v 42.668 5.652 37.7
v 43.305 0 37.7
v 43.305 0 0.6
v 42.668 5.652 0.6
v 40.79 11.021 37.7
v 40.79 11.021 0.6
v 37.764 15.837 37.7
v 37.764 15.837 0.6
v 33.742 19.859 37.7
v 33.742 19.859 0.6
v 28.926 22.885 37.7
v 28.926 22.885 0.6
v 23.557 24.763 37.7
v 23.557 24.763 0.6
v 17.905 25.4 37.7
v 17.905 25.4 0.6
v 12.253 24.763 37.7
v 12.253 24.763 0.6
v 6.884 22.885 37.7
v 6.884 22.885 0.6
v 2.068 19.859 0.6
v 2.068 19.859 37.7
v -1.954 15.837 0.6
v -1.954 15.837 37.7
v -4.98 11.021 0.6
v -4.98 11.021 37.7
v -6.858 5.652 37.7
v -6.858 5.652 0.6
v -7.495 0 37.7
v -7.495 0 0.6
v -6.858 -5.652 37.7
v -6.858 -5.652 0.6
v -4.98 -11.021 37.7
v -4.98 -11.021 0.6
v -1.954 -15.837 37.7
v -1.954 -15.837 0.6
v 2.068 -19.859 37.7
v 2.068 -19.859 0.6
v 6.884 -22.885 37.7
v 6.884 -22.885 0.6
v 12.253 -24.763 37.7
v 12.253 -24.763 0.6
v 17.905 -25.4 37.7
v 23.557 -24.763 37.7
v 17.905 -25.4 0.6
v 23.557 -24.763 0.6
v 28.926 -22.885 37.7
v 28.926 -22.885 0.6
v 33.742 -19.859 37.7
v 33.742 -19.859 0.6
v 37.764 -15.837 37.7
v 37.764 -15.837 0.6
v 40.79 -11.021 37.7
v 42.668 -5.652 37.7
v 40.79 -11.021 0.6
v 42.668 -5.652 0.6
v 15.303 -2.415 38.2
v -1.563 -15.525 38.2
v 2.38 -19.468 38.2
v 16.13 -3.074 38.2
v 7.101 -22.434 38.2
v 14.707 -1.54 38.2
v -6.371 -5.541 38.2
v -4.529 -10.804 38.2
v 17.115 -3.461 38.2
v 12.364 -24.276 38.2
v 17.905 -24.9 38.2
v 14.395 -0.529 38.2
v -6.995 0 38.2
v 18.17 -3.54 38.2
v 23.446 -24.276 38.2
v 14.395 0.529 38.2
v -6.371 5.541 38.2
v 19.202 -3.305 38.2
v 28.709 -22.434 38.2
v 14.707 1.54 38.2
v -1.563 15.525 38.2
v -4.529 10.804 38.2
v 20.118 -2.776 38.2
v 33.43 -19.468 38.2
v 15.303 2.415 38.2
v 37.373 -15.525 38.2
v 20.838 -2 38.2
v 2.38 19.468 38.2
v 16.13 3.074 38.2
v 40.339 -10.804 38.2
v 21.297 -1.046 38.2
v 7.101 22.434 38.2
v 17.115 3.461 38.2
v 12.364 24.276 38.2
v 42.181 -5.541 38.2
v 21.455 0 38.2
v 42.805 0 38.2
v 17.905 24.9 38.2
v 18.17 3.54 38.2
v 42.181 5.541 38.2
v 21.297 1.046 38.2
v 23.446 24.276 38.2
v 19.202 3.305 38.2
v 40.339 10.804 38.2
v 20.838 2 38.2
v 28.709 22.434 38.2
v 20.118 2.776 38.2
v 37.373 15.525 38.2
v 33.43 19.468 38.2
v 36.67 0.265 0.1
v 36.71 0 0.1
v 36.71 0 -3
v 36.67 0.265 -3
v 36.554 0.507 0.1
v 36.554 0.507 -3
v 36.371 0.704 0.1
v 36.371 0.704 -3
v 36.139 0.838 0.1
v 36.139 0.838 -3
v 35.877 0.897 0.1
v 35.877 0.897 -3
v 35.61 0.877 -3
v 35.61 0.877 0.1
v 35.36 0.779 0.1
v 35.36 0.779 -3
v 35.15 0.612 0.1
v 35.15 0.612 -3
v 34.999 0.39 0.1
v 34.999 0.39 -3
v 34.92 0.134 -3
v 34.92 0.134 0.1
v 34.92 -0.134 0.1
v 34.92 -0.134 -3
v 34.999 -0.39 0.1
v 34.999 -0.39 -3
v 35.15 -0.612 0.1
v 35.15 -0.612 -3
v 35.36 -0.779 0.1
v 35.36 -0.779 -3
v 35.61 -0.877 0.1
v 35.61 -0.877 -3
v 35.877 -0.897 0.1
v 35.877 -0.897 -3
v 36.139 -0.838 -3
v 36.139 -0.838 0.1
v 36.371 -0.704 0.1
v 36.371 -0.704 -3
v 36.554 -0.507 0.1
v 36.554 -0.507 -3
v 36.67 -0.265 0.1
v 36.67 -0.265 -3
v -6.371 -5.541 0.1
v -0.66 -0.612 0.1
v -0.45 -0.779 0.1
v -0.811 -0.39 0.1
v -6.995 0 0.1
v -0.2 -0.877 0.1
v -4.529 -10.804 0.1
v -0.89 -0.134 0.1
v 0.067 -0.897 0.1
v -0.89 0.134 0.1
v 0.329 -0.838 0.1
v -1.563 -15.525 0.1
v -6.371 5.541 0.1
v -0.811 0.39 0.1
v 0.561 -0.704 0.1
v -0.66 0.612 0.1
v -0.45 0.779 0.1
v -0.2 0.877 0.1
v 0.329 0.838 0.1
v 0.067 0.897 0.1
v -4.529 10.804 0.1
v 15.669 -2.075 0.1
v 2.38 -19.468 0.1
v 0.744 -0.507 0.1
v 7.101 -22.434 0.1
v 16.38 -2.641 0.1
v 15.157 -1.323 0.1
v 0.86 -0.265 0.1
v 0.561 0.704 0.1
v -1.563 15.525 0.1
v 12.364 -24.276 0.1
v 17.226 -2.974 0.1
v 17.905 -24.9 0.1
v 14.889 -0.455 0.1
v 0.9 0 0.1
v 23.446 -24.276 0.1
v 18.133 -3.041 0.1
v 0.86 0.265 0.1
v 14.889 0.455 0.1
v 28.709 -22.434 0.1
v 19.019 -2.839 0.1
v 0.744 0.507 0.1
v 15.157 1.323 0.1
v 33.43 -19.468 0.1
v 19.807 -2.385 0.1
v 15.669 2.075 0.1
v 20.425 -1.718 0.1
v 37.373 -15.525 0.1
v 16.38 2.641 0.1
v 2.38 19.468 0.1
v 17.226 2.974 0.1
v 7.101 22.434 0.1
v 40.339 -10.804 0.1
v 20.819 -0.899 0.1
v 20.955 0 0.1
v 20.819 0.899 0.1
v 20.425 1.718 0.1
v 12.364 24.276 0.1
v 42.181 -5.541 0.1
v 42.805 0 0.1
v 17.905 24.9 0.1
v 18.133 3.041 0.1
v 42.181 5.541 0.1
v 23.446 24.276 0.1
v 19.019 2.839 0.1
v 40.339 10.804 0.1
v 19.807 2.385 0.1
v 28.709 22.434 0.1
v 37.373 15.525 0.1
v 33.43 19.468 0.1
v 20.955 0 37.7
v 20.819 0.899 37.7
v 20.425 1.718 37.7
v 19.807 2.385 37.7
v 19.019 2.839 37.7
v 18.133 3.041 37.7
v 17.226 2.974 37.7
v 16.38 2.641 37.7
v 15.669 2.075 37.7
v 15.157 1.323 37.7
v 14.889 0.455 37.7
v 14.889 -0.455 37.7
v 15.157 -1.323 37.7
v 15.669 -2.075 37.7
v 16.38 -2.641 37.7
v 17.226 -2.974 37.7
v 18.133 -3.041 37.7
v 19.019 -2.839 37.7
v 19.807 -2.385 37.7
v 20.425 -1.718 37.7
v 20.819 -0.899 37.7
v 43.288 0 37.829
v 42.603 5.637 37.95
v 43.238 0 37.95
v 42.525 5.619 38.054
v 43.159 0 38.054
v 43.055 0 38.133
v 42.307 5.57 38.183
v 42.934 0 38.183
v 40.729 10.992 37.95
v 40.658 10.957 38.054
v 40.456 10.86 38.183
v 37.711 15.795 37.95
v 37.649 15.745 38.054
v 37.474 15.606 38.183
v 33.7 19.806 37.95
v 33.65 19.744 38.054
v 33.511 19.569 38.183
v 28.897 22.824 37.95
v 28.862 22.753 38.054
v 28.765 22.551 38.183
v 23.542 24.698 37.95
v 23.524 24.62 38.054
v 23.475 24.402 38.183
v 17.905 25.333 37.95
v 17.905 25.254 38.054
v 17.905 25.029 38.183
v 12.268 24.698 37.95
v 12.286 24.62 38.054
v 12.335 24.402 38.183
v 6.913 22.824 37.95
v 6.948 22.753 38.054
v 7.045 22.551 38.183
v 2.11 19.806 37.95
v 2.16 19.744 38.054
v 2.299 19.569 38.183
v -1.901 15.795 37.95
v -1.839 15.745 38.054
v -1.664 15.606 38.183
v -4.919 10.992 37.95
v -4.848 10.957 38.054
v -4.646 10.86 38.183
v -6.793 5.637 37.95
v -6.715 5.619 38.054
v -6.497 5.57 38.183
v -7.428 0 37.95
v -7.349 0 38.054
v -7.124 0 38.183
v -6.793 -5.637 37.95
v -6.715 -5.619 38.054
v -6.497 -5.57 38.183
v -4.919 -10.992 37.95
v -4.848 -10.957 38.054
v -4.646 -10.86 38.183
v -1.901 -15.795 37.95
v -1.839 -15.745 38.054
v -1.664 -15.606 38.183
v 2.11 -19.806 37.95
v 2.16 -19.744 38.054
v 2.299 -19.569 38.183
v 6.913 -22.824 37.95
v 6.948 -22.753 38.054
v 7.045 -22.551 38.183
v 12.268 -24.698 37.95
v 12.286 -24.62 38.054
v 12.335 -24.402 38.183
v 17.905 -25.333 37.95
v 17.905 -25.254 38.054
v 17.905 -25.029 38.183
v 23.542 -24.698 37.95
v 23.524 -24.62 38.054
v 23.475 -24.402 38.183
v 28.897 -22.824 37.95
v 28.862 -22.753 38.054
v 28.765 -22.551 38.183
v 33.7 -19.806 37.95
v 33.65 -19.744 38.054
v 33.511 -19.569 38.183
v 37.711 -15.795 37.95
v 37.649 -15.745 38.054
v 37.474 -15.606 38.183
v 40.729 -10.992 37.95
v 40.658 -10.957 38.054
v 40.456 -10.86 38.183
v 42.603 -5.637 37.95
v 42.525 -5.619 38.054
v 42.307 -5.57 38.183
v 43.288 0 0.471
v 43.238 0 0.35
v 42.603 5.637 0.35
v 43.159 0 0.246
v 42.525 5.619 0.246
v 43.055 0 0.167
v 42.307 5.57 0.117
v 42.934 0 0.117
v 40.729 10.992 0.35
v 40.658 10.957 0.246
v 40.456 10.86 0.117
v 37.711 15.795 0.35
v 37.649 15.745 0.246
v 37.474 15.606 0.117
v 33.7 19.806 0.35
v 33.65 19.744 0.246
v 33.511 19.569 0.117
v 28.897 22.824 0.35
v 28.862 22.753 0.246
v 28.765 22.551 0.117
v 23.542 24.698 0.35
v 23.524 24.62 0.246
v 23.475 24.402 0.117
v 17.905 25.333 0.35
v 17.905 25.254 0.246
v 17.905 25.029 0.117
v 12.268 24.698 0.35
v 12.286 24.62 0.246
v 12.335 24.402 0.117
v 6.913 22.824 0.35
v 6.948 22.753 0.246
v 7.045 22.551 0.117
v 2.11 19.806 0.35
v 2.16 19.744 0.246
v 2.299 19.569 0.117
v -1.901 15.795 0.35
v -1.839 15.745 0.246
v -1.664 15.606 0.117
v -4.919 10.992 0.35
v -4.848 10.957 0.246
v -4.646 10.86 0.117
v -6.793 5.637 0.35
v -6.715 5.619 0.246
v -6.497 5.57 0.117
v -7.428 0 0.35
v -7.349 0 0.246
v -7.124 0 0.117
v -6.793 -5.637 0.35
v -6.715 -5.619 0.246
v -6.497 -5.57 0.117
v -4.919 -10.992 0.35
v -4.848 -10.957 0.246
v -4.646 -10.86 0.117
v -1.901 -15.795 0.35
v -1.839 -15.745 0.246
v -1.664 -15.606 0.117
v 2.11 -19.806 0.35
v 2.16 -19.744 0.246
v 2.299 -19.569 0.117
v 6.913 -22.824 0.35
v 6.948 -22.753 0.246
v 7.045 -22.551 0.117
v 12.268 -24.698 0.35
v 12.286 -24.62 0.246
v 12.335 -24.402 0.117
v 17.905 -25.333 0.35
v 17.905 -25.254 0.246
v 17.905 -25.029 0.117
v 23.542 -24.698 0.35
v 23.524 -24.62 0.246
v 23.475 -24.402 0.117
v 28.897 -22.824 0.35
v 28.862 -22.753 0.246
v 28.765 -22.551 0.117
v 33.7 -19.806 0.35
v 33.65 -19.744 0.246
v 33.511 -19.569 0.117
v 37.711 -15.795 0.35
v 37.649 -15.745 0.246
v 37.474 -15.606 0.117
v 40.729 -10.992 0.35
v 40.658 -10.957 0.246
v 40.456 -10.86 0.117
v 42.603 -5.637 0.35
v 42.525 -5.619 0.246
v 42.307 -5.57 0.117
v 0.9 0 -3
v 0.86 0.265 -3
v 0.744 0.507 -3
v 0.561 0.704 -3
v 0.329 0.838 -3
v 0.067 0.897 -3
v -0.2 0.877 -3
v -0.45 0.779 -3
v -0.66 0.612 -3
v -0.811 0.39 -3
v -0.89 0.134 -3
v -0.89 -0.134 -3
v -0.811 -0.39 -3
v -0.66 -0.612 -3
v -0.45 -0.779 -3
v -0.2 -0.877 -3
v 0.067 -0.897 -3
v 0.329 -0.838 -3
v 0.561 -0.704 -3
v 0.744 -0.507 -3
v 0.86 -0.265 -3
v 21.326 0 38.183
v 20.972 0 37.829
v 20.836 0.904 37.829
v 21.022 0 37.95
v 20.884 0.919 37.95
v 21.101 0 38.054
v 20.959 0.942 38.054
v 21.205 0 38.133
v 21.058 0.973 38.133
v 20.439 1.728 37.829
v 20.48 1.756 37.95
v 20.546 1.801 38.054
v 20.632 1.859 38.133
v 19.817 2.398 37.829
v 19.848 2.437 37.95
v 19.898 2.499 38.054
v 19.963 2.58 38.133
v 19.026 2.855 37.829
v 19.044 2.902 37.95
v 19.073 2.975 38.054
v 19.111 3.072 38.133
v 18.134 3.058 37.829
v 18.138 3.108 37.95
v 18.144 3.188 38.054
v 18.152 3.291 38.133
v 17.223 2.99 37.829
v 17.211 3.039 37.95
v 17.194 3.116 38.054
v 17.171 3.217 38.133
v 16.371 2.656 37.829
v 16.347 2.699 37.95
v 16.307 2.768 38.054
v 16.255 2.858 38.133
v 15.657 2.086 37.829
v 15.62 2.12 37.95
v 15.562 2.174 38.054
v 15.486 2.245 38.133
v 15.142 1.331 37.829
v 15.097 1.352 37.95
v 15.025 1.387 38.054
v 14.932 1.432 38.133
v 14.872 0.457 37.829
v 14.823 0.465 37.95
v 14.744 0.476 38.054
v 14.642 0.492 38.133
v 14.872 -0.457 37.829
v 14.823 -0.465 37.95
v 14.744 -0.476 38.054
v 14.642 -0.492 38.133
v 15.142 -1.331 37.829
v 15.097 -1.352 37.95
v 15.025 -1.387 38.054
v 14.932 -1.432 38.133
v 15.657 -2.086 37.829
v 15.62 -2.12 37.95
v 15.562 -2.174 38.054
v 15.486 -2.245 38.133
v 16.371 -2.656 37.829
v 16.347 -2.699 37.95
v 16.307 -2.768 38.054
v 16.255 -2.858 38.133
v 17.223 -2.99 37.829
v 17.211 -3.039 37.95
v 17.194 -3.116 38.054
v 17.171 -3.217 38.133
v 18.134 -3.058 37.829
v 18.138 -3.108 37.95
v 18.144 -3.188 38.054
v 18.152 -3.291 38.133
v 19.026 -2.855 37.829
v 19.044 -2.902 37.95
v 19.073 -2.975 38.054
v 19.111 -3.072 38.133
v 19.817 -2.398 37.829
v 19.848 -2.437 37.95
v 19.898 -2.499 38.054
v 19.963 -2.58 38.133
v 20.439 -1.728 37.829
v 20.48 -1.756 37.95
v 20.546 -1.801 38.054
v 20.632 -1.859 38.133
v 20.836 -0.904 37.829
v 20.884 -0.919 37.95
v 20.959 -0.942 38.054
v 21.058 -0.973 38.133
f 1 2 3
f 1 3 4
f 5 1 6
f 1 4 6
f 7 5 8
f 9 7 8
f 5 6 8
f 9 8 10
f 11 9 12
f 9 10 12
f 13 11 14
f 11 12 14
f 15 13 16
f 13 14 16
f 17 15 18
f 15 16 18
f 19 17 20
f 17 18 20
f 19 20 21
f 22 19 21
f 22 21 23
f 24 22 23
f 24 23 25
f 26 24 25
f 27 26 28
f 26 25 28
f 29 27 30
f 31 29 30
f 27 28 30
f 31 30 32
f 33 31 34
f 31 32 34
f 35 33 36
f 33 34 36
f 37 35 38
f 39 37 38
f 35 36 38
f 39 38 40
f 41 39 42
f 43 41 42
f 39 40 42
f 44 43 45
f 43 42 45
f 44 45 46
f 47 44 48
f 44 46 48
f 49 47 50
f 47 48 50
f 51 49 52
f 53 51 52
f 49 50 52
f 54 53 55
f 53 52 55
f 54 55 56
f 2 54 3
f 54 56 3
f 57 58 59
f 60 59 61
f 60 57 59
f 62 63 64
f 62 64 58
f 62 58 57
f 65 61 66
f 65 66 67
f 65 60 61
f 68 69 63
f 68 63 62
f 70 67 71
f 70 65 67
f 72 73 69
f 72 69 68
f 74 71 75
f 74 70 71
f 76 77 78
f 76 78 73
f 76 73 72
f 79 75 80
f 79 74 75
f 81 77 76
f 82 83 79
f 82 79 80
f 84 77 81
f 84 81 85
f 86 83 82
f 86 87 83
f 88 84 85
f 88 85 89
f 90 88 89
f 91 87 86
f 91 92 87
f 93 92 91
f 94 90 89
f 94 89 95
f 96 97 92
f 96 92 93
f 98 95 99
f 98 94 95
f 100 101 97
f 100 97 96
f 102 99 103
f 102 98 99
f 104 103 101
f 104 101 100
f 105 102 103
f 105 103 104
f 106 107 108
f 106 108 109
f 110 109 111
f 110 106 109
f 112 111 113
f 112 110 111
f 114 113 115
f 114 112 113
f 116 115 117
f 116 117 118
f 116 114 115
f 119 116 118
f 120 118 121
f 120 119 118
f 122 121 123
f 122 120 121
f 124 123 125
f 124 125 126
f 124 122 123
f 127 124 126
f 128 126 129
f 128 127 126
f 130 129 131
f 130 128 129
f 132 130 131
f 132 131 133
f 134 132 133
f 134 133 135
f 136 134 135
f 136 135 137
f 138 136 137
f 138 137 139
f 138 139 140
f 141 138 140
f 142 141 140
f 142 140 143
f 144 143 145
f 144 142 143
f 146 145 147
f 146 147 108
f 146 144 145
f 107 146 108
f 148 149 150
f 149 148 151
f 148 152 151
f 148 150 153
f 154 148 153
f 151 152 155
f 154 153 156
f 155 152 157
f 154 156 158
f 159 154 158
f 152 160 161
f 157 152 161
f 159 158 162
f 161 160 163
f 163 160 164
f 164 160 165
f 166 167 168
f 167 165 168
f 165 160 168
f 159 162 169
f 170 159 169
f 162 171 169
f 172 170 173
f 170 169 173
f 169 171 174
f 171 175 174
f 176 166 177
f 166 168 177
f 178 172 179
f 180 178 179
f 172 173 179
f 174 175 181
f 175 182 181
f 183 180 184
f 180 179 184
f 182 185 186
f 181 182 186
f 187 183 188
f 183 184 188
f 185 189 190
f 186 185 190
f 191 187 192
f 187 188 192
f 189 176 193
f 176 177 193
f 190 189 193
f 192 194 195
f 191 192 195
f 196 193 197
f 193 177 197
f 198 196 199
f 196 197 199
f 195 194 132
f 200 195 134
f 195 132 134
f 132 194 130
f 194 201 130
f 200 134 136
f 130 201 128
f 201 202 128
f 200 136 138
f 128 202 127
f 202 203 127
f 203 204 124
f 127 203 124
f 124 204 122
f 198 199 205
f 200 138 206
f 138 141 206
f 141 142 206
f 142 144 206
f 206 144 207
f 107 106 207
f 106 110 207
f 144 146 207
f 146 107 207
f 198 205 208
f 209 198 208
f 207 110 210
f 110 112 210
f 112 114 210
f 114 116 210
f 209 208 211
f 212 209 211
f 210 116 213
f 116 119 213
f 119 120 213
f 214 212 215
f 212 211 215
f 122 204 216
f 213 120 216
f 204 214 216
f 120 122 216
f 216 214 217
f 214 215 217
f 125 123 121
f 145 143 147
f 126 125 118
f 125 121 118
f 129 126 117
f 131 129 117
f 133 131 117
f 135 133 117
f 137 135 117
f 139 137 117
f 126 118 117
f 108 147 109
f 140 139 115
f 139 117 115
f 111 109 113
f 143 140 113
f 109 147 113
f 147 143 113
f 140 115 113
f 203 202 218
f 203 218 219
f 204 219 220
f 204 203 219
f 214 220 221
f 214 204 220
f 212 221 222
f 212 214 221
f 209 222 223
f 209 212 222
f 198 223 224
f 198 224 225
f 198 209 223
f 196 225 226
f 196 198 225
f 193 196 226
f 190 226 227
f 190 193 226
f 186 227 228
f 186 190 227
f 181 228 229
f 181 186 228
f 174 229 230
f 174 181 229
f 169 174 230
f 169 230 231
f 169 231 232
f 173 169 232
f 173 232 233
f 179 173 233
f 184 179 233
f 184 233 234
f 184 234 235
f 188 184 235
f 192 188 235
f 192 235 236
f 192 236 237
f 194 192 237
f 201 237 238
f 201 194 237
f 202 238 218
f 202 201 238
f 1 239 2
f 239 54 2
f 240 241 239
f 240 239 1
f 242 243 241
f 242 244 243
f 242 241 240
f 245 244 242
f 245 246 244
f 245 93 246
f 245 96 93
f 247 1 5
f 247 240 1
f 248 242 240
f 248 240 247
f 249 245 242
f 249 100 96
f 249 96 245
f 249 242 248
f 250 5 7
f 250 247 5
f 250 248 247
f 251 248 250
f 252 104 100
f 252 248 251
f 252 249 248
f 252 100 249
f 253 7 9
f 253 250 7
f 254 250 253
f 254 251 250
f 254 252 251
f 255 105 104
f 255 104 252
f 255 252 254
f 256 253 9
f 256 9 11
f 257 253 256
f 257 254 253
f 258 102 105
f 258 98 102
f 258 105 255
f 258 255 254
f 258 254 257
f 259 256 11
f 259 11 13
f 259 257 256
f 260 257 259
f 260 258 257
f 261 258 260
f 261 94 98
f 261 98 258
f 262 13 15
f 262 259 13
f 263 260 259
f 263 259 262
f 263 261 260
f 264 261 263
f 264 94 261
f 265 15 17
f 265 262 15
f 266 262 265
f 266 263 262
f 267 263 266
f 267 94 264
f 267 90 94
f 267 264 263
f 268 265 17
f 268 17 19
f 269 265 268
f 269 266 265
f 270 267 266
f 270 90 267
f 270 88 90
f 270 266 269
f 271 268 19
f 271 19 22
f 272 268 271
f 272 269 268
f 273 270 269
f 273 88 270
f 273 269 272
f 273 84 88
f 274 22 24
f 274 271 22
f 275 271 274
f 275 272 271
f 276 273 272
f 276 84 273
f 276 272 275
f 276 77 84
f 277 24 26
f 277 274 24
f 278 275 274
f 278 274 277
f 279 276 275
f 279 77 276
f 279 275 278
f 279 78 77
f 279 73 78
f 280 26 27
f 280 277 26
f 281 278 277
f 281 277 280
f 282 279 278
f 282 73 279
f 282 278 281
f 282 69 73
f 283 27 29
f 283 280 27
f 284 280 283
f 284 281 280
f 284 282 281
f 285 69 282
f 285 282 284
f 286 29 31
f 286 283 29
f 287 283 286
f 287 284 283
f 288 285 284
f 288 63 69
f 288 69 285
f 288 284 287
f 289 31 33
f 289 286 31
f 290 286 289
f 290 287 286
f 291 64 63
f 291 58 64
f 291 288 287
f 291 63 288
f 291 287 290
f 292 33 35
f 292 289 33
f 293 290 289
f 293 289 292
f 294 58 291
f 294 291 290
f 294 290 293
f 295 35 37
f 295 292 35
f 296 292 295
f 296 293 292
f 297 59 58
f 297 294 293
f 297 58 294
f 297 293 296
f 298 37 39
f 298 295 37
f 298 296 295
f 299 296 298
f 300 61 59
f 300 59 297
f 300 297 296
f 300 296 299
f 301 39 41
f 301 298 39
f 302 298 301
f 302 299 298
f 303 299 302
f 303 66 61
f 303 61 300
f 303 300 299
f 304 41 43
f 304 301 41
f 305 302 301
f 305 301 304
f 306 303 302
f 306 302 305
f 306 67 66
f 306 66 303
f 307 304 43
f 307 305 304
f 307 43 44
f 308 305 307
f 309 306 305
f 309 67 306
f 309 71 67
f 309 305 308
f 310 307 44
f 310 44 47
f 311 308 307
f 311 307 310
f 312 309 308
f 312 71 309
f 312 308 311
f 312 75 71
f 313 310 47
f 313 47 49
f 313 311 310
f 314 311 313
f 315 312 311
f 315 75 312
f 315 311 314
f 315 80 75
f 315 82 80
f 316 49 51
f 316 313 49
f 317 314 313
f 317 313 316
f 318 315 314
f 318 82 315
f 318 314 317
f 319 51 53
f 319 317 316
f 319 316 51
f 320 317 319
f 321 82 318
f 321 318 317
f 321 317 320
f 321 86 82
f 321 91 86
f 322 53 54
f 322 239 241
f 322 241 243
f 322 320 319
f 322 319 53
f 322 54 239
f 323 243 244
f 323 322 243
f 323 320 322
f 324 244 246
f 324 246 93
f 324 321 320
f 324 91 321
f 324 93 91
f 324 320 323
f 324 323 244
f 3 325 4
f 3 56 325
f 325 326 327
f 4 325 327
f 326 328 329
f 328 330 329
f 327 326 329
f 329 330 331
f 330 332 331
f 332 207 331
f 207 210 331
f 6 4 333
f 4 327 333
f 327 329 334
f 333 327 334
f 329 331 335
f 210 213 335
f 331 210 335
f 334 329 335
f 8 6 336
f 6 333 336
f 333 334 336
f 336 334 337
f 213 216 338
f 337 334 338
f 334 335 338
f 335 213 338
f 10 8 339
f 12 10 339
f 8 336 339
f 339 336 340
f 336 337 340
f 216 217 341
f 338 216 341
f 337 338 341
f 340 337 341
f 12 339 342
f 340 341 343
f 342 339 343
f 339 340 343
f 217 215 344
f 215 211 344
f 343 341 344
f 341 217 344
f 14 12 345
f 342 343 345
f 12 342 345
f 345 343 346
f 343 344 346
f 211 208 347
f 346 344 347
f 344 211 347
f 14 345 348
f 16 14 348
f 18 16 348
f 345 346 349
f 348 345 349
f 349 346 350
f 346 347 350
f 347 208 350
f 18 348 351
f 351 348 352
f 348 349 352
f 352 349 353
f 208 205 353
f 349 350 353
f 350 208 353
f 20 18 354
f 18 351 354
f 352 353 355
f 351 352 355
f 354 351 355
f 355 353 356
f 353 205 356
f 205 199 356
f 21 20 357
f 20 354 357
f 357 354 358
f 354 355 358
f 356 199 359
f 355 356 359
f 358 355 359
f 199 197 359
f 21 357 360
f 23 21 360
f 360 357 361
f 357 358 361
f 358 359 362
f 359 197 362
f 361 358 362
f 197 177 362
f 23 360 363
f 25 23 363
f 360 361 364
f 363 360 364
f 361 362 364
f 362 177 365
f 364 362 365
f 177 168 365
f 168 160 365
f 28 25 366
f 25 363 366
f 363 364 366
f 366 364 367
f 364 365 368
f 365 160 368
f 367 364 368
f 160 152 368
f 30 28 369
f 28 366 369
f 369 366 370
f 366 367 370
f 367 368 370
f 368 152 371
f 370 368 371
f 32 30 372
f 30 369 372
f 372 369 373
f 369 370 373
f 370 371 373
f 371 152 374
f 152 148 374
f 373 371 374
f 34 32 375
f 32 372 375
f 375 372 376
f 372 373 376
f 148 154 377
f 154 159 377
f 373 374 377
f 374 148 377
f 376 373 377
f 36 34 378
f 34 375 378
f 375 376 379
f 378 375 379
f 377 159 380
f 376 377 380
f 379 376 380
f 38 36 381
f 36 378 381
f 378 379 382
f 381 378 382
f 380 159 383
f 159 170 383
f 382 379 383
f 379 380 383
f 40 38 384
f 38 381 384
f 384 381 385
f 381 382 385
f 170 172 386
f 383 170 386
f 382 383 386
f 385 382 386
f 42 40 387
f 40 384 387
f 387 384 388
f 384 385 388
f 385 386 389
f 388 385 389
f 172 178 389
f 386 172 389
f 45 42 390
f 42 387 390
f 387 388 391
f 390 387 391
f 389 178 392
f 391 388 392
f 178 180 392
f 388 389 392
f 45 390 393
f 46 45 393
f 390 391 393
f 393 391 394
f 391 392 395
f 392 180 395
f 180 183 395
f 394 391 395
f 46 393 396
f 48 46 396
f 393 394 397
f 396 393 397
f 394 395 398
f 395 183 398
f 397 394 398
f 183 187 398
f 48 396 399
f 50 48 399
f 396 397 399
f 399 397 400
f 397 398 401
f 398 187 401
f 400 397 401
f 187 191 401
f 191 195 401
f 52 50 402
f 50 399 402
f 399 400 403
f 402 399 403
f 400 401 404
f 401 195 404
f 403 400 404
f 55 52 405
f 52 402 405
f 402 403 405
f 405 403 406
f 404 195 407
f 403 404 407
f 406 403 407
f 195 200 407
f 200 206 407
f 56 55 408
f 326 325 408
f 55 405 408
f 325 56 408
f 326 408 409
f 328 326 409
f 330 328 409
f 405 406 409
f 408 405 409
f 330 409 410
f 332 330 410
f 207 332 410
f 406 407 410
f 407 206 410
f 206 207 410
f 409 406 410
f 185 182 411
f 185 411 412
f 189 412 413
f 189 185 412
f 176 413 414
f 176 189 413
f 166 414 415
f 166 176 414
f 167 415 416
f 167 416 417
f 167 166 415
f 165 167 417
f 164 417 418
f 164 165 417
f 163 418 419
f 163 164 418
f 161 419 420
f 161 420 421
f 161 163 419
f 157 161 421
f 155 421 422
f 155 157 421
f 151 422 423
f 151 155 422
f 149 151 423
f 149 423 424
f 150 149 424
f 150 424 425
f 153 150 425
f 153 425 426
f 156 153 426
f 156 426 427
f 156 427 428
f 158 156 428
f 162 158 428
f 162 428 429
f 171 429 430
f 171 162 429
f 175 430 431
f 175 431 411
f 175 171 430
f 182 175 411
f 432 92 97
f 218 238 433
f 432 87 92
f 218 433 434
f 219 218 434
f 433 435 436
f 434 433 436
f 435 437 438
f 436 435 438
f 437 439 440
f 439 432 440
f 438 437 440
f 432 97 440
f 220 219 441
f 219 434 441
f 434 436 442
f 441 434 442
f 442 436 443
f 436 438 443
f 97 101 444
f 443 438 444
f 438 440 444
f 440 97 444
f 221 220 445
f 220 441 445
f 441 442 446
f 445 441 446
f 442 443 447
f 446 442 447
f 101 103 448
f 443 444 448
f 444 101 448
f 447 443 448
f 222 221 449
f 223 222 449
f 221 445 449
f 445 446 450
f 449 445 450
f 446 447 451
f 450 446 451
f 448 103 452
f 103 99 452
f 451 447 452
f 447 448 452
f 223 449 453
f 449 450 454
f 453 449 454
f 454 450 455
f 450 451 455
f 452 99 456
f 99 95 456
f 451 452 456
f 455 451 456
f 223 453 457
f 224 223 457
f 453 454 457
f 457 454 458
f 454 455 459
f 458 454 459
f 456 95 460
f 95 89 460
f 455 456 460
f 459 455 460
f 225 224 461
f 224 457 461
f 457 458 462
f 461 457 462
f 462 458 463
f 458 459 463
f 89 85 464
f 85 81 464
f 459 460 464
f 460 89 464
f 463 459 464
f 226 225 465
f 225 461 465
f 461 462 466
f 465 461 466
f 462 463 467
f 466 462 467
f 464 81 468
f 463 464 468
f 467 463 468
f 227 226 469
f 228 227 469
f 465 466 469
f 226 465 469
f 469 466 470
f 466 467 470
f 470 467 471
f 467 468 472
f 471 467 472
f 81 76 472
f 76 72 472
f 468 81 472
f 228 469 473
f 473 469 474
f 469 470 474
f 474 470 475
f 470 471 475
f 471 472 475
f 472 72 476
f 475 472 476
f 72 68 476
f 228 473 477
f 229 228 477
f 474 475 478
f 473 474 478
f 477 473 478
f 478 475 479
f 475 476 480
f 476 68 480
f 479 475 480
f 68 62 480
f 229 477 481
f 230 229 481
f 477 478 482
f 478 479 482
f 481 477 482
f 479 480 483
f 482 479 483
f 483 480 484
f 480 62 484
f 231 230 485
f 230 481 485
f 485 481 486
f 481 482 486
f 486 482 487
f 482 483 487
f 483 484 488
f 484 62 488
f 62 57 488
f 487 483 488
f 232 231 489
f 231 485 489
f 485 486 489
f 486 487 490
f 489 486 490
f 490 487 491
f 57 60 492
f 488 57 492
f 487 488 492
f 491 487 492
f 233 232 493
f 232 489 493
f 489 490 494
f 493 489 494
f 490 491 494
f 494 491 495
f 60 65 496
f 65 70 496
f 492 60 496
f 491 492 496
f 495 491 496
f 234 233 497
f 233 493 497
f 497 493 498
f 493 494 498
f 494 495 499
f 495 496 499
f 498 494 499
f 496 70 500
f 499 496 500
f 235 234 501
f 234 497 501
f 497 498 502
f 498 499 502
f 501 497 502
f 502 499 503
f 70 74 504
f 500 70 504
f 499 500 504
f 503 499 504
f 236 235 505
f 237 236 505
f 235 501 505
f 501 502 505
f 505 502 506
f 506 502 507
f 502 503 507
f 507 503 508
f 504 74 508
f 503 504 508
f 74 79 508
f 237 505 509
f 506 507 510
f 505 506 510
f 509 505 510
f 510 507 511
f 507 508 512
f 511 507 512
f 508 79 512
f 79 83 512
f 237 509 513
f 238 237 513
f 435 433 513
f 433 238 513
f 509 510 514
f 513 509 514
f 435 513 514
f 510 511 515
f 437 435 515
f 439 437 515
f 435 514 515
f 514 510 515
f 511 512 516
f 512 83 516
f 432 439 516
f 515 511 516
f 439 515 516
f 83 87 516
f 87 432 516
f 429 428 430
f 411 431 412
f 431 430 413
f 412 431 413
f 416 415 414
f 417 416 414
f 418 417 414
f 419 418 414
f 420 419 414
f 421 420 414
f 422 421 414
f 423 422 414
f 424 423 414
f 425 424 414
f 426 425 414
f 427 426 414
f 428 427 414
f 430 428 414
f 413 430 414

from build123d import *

# Parameters (mm, degrees)
SKETCH_R          = 25.4
SKETCH_R_2        = 3.05
PAD_DEPTH         = 38.1
FILLET_R          = 0.5
SKETCH001_R       = 0.9
PAD001_DEPTH      = 19.05
PAD001_DEPTH_BACK = 3.5


with BuildPart() as fillet_body:
    # Sketch → Pad (new body)
    with BuildSketch(Plane.XY.offset(0.1)):
        with Locations((17.905, 0)):
            Circle(SKETCH_R)
        with Locations((17.905, 0)):
            Circle(SKETCH_R_2, mode=Mode.SUBTRACT)
    extrude(amount=PAD_DEPTH)

    # Fillet
    fillet_edges = [fillet_body.edges().sort_by_distance(p)[0] for p in [
        (14.855, 0, 38.2),
        (-7.495, 0, 38.2),
        (-7.495, 0, 0.1),
    ]]
    fillet(fillet_edges, radius=FILLET_R)


with BuildPart() as pad001_mp_cp:
    # Sketch001 → Pad001 (new body, two sides)
    with BuildSketch(Plane.XY.offset(0.5)) as pad001_sk:
        Circle(SKETCH001_R)
        with Locations((35.81, 0)):
            Circle(SKETCH001_R)
    extrude(amount=PAD001_DEPTH)
    extrude(pad001_sk.sketch, amount=-PAD001_DEPTH_BACK)

    # Pad001_mp_cp: union Fillet body
    add(fillet_body.part)


solid = pad001_mp_cp.part
